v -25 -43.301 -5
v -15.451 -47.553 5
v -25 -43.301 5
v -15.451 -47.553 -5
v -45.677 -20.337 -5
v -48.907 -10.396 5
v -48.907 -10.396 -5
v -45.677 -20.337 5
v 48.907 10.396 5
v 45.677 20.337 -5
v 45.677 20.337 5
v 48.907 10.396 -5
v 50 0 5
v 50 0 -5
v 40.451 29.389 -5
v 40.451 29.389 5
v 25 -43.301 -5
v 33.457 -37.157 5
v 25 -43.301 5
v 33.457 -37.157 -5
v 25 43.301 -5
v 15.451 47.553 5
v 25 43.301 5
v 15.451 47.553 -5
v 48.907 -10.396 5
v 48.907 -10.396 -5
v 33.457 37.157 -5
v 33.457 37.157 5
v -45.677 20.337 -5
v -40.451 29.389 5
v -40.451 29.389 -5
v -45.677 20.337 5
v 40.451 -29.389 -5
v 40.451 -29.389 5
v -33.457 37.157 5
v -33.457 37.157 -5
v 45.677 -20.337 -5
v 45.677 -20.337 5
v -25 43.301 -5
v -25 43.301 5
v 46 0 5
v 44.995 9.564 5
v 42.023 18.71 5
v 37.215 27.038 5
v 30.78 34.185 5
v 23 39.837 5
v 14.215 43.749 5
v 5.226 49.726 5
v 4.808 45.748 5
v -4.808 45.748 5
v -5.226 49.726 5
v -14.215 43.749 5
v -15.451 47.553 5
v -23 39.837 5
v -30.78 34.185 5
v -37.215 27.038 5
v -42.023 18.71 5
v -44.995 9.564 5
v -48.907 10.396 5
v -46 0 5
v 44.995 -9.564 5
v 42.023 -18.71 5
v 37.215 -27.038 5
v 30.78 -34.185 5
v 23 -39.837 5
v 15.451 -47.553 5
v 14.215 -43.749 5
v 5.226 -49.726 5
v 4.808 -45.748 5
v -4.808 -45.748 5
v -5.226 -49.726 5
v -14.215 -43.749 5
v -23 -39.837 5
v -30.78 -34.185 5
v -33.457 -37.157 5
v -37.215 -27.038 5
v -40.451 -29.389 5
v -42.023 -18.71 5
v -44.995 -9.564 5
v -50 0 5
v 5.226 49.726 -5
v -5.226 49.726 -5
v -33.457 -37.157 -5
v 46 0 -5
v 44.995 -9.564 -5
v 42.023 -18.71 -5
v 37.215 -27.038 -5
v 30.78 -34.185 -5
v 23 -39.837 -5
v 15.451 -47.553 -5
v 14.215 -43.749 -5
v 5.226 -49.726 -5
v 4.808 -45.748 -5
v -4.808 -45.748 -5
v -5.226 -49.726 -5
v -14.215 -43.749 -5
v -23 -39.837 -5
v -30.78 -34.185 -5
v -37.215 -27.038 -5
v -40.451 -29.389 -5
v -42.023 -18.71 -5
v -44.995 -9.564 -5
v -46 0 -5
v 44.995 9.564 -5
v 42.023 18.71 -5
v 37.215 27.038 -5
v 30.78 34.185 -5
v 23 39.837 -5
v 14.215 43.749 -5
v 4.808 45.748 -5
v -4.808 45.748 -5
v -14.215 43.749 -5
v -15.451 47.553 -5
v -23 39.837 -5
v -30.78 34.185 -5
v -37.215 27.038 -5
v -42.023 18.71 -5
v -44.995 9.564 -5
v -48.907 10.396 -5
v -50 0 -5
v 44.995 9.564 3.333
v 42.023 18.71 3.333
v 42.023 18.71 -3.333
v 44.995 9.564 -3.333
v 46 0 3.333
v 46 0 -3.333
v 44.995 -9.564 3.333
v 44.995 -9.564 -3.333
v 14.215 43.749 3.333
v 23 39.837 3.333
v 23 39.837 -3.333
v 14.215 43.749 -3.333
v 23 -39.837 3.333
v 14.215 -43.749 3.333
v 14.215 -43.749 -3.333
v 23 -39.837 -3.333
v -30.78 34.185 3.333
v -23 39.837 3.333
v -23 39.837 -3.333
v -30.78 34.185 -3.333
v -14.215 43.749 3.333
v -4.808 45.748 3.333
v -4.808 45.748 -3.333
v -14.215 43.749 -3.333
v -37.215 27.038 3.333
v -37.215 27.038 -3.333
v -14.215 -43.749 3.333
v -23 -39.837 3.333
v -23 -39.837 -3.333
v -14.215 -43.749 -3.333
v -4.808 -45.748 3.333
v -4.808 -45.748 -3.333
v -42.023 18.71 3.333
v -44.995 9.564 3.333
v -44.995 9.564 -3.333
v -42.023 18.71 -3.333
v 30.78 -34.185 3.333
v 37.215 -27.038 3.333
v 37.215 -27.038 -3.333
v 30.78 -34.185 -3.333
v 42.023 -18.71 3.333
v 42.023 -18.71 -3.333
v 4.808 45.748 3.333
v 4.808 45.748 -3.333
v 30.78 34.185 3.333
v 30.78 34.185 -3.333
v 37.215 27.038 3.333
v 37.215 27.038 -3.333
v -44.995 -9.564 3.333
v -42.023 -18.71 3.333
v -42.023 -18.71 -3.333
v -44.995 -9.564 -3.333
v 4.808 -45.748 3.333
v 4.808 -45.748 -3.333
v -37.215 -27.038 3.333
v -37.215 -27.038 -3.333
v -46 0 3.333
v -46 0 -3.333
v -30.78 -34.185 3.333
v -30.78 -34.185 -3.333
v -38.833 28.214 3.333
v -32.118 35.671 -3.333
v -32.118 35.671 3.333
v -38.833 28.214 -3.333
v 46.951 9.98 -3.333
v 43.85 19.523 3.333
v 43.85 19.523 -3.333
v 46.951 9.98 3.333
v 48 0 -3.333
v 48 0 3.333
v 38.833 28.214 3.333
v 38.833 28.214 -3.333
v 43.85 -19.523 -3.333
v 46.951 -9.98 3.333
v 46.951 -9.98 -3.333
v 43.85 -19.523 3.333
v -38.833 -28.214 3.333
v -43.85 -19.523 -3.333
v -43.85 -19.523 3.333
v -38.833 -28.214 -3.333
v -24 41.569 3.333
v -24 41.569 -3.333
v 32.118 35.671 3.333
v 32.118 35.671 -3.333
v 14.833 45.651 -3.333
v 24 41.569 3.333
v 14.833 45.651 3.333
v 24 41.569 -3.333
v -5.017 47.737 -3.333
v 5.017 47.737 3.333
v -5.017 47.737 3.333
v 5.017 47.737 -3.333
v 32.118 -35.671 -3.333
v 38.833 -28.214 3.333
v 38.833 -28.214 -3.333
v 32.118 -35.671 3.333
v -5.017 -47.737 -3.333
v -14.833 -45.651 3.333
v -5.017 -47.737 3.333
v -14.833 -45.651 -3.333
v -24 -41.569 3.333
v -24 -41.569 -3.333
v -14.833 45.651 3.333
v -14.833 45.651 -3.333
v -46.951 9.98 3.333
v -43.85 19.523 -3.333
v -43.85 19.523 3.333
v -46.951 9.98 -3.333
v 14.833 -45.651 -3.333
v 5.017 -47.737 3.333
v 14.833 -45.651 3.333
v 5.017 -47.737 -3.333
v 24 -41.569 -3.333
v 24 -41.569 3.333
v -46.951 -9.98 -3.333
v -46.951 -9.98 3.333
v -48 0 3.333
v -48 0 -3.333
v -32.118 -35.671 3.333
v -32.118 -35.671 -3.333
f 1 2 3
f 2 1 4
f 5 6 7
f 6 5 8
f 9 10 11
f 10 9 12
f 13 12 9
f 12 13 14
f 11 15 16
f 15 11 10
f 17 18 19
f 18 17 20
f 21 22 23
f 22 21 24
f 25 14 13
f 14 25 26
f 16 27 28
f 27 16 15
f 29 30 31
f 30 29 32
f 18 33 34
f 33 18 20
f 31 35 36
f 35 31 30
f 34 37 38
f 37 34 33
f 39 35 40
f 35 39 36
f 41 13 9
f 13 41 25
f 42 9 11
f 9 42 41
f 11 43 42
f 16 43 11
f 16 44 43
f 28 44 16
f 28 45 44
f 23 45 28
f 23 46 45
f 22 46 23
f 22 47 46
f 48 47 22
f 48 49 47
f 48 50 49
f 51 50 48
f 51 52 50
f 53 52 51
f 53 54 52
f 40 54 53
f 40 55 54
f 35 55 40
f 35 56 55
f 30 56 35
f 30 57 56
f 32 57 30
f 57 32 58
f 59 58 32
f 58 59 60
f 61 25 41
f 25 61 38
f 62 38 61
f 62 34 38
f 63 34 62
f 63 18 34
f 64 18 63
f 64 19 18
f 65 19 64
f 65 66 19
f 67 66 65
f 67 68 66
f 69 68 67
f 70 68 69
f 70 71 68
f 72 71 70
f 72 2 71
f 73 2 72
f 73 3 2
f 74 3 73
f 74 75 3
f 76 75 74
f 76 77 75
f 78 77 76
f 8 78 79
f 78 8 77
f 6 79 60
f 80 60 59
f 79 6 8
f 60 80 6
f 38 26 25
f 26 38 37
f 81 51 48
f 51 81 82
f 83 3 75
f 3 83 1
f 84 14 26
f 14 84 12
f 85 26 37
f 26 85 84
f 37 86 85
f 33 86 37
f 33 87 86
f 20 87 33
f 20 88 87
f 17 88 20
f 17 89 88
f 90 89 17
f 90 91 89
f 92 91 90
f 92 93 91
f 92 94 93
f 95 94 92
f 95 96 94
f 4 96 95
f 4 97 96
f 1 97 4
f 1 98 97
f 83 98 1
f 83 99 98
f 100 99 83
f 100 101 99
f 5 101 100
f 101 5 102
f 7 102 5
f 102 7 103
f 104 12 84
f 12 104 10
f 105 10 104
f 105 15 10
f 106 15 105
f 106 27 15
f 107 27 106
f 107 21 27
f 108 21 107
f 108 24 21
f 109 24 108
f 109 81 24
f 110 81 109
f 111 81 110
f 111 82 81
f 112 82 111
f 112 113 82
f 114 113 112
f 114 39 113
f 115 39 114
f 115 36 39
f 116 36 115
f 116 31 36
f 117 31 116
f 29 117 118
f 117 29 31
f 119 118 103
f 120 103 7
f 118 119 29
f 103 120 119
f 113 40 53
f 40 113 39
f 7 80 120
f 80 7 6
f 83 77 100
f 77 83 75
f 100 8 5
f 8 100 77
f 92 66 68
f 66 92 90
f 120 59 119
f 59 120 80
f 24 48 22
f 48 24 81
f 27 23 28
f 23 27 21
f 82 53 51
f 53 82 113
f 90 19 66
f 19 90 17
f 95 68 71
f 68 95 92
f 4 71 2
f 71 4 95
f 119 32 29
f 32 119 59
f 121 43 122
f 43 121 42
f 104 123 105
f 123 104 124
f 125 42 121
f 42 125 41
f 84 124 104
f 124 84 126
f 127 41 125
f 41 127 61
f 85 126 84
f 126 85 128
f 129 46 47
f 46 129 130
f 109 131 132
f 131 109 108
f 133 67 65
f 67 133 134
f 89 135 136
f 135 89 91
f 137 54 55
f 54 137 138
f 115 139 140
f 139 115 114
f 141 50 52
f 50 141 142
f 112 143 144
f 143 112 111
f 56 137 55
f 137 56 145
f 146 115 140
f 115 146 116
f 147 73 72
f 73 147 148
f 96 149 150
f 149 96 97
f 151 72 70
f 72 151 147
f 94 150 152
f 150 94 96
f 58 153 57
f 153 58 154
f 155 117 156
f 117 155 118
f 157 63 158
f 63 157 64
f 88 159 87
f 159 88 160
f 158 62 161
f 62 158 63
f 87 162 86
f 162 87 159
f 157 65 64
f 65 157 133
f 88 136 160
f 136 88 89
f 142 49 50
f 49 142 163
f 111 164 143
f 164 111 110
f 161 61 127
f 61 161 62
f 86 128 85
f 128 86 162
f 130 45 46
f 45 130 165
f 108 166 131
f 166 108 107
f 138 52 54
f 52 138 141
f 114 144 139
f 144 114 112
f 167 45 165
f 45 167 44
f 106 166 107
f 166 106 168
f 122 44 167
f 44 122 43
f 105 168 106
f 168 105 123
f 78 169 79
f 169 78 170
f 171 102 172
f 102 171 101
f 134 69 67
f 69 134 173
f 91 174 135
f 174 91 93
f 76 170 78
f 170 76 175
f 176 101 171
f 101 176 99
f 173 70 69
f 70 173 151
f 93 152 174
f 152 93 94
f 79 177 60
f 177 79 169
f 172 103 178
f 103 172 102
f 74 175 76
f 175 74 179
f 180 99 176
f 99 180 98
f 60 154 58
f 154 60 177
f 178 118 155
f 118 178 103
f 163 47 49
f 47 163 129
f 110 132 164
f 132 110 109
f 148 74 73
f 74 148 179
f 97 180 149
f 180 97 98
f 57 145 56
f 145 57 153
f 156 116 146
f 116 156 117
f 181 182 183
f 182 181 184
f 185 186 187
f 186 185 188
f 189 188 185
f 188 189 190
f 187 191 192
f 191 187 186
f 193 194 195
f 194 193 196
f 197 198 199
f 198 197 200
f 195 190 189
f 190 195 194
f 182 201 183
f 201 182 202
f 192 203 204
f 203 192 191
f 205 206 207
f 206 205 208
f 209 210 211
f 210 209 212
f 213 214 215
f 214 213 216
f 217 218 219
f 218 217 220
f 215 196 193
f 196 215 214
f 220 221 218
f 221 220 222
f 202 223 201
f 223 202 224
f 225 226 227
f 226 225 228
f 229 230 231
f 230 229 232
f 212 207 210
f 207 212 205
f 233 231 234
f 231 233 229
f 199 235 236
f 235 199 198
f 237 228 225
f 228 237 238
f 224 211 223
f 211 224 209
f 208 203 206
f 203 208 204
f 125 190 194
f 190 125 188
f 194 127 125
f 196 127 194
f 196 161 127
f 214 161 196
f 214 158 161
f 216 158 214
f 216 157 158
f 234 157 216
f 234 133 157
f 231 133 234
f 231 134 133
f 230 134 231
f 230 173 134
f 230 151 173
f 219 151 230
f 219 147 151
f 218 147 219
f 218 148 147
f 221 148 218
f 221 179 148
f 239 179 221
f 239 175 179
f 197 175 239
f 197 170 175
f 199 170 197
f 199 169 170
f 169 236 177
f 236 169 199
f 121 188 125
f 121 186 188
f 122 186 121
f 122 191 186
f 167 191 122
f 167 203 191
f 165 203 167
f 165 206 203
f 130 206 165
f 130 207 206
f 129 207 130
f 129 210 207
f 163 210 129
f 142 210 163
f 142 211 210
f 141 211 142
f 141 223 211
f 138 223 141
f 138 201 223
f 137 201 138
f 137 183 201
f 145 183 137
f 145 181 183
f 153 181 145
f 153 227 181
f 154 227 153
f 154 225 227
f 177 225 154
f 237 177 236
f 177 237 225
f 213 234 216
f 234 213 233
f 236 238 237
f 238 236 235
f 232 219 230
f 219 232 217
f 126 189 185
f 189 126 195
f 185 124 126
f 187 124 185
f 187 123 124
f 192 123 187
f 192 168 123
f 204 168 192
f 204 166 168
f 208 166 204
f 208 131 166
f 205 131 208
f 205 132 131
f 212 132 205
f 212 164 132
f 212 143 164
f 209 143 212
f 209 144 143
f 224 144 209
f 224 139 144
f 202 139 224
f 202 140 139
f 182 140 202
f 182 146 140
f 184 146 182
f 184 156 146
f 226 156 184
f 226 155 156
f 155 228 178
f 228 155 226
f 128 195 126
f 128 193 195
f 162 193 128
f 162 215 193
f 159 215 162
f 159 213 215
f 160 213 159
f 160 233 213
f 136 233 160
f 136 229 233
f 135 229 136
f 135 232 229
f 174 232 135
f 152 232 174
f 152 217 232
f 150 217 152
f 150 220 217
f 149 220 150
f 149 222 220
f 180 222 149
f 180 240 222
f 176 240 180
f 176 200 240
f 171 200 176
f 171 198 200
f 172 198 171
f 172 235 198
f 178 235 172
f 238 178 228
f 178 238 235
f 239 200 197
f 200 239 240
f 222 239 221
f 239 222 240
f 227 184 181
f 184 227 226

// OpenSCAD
h=10; //altezza cuscinetto
r=50; //raggio esterno
sp=4; //spessore parete


module anello_noSC(h1,r1,sp1){
difference(){
    cylinder(h1,r1,r1,true); //cilindro principale
    cylinder(h1+5,r1-sp1,r1-sp1,true); //foro
}
}

//FUNZIONE PRINCIPALE

//projection(cut=true)
union(){
!difference(){
    anello_noSC(h,r,sp);
    #anello_noSC(h*2/3,r-sp/2,sp);
}

difference(){
    anello_noSC(h,r-20,sp);
    anello_noSC(h*2/3,r-19,sp/2+1);
}
}

for(i=[0:30:360]){
rotate([0,0,i])
translate ([37.8,0,0]) sphere(9.90);
}
